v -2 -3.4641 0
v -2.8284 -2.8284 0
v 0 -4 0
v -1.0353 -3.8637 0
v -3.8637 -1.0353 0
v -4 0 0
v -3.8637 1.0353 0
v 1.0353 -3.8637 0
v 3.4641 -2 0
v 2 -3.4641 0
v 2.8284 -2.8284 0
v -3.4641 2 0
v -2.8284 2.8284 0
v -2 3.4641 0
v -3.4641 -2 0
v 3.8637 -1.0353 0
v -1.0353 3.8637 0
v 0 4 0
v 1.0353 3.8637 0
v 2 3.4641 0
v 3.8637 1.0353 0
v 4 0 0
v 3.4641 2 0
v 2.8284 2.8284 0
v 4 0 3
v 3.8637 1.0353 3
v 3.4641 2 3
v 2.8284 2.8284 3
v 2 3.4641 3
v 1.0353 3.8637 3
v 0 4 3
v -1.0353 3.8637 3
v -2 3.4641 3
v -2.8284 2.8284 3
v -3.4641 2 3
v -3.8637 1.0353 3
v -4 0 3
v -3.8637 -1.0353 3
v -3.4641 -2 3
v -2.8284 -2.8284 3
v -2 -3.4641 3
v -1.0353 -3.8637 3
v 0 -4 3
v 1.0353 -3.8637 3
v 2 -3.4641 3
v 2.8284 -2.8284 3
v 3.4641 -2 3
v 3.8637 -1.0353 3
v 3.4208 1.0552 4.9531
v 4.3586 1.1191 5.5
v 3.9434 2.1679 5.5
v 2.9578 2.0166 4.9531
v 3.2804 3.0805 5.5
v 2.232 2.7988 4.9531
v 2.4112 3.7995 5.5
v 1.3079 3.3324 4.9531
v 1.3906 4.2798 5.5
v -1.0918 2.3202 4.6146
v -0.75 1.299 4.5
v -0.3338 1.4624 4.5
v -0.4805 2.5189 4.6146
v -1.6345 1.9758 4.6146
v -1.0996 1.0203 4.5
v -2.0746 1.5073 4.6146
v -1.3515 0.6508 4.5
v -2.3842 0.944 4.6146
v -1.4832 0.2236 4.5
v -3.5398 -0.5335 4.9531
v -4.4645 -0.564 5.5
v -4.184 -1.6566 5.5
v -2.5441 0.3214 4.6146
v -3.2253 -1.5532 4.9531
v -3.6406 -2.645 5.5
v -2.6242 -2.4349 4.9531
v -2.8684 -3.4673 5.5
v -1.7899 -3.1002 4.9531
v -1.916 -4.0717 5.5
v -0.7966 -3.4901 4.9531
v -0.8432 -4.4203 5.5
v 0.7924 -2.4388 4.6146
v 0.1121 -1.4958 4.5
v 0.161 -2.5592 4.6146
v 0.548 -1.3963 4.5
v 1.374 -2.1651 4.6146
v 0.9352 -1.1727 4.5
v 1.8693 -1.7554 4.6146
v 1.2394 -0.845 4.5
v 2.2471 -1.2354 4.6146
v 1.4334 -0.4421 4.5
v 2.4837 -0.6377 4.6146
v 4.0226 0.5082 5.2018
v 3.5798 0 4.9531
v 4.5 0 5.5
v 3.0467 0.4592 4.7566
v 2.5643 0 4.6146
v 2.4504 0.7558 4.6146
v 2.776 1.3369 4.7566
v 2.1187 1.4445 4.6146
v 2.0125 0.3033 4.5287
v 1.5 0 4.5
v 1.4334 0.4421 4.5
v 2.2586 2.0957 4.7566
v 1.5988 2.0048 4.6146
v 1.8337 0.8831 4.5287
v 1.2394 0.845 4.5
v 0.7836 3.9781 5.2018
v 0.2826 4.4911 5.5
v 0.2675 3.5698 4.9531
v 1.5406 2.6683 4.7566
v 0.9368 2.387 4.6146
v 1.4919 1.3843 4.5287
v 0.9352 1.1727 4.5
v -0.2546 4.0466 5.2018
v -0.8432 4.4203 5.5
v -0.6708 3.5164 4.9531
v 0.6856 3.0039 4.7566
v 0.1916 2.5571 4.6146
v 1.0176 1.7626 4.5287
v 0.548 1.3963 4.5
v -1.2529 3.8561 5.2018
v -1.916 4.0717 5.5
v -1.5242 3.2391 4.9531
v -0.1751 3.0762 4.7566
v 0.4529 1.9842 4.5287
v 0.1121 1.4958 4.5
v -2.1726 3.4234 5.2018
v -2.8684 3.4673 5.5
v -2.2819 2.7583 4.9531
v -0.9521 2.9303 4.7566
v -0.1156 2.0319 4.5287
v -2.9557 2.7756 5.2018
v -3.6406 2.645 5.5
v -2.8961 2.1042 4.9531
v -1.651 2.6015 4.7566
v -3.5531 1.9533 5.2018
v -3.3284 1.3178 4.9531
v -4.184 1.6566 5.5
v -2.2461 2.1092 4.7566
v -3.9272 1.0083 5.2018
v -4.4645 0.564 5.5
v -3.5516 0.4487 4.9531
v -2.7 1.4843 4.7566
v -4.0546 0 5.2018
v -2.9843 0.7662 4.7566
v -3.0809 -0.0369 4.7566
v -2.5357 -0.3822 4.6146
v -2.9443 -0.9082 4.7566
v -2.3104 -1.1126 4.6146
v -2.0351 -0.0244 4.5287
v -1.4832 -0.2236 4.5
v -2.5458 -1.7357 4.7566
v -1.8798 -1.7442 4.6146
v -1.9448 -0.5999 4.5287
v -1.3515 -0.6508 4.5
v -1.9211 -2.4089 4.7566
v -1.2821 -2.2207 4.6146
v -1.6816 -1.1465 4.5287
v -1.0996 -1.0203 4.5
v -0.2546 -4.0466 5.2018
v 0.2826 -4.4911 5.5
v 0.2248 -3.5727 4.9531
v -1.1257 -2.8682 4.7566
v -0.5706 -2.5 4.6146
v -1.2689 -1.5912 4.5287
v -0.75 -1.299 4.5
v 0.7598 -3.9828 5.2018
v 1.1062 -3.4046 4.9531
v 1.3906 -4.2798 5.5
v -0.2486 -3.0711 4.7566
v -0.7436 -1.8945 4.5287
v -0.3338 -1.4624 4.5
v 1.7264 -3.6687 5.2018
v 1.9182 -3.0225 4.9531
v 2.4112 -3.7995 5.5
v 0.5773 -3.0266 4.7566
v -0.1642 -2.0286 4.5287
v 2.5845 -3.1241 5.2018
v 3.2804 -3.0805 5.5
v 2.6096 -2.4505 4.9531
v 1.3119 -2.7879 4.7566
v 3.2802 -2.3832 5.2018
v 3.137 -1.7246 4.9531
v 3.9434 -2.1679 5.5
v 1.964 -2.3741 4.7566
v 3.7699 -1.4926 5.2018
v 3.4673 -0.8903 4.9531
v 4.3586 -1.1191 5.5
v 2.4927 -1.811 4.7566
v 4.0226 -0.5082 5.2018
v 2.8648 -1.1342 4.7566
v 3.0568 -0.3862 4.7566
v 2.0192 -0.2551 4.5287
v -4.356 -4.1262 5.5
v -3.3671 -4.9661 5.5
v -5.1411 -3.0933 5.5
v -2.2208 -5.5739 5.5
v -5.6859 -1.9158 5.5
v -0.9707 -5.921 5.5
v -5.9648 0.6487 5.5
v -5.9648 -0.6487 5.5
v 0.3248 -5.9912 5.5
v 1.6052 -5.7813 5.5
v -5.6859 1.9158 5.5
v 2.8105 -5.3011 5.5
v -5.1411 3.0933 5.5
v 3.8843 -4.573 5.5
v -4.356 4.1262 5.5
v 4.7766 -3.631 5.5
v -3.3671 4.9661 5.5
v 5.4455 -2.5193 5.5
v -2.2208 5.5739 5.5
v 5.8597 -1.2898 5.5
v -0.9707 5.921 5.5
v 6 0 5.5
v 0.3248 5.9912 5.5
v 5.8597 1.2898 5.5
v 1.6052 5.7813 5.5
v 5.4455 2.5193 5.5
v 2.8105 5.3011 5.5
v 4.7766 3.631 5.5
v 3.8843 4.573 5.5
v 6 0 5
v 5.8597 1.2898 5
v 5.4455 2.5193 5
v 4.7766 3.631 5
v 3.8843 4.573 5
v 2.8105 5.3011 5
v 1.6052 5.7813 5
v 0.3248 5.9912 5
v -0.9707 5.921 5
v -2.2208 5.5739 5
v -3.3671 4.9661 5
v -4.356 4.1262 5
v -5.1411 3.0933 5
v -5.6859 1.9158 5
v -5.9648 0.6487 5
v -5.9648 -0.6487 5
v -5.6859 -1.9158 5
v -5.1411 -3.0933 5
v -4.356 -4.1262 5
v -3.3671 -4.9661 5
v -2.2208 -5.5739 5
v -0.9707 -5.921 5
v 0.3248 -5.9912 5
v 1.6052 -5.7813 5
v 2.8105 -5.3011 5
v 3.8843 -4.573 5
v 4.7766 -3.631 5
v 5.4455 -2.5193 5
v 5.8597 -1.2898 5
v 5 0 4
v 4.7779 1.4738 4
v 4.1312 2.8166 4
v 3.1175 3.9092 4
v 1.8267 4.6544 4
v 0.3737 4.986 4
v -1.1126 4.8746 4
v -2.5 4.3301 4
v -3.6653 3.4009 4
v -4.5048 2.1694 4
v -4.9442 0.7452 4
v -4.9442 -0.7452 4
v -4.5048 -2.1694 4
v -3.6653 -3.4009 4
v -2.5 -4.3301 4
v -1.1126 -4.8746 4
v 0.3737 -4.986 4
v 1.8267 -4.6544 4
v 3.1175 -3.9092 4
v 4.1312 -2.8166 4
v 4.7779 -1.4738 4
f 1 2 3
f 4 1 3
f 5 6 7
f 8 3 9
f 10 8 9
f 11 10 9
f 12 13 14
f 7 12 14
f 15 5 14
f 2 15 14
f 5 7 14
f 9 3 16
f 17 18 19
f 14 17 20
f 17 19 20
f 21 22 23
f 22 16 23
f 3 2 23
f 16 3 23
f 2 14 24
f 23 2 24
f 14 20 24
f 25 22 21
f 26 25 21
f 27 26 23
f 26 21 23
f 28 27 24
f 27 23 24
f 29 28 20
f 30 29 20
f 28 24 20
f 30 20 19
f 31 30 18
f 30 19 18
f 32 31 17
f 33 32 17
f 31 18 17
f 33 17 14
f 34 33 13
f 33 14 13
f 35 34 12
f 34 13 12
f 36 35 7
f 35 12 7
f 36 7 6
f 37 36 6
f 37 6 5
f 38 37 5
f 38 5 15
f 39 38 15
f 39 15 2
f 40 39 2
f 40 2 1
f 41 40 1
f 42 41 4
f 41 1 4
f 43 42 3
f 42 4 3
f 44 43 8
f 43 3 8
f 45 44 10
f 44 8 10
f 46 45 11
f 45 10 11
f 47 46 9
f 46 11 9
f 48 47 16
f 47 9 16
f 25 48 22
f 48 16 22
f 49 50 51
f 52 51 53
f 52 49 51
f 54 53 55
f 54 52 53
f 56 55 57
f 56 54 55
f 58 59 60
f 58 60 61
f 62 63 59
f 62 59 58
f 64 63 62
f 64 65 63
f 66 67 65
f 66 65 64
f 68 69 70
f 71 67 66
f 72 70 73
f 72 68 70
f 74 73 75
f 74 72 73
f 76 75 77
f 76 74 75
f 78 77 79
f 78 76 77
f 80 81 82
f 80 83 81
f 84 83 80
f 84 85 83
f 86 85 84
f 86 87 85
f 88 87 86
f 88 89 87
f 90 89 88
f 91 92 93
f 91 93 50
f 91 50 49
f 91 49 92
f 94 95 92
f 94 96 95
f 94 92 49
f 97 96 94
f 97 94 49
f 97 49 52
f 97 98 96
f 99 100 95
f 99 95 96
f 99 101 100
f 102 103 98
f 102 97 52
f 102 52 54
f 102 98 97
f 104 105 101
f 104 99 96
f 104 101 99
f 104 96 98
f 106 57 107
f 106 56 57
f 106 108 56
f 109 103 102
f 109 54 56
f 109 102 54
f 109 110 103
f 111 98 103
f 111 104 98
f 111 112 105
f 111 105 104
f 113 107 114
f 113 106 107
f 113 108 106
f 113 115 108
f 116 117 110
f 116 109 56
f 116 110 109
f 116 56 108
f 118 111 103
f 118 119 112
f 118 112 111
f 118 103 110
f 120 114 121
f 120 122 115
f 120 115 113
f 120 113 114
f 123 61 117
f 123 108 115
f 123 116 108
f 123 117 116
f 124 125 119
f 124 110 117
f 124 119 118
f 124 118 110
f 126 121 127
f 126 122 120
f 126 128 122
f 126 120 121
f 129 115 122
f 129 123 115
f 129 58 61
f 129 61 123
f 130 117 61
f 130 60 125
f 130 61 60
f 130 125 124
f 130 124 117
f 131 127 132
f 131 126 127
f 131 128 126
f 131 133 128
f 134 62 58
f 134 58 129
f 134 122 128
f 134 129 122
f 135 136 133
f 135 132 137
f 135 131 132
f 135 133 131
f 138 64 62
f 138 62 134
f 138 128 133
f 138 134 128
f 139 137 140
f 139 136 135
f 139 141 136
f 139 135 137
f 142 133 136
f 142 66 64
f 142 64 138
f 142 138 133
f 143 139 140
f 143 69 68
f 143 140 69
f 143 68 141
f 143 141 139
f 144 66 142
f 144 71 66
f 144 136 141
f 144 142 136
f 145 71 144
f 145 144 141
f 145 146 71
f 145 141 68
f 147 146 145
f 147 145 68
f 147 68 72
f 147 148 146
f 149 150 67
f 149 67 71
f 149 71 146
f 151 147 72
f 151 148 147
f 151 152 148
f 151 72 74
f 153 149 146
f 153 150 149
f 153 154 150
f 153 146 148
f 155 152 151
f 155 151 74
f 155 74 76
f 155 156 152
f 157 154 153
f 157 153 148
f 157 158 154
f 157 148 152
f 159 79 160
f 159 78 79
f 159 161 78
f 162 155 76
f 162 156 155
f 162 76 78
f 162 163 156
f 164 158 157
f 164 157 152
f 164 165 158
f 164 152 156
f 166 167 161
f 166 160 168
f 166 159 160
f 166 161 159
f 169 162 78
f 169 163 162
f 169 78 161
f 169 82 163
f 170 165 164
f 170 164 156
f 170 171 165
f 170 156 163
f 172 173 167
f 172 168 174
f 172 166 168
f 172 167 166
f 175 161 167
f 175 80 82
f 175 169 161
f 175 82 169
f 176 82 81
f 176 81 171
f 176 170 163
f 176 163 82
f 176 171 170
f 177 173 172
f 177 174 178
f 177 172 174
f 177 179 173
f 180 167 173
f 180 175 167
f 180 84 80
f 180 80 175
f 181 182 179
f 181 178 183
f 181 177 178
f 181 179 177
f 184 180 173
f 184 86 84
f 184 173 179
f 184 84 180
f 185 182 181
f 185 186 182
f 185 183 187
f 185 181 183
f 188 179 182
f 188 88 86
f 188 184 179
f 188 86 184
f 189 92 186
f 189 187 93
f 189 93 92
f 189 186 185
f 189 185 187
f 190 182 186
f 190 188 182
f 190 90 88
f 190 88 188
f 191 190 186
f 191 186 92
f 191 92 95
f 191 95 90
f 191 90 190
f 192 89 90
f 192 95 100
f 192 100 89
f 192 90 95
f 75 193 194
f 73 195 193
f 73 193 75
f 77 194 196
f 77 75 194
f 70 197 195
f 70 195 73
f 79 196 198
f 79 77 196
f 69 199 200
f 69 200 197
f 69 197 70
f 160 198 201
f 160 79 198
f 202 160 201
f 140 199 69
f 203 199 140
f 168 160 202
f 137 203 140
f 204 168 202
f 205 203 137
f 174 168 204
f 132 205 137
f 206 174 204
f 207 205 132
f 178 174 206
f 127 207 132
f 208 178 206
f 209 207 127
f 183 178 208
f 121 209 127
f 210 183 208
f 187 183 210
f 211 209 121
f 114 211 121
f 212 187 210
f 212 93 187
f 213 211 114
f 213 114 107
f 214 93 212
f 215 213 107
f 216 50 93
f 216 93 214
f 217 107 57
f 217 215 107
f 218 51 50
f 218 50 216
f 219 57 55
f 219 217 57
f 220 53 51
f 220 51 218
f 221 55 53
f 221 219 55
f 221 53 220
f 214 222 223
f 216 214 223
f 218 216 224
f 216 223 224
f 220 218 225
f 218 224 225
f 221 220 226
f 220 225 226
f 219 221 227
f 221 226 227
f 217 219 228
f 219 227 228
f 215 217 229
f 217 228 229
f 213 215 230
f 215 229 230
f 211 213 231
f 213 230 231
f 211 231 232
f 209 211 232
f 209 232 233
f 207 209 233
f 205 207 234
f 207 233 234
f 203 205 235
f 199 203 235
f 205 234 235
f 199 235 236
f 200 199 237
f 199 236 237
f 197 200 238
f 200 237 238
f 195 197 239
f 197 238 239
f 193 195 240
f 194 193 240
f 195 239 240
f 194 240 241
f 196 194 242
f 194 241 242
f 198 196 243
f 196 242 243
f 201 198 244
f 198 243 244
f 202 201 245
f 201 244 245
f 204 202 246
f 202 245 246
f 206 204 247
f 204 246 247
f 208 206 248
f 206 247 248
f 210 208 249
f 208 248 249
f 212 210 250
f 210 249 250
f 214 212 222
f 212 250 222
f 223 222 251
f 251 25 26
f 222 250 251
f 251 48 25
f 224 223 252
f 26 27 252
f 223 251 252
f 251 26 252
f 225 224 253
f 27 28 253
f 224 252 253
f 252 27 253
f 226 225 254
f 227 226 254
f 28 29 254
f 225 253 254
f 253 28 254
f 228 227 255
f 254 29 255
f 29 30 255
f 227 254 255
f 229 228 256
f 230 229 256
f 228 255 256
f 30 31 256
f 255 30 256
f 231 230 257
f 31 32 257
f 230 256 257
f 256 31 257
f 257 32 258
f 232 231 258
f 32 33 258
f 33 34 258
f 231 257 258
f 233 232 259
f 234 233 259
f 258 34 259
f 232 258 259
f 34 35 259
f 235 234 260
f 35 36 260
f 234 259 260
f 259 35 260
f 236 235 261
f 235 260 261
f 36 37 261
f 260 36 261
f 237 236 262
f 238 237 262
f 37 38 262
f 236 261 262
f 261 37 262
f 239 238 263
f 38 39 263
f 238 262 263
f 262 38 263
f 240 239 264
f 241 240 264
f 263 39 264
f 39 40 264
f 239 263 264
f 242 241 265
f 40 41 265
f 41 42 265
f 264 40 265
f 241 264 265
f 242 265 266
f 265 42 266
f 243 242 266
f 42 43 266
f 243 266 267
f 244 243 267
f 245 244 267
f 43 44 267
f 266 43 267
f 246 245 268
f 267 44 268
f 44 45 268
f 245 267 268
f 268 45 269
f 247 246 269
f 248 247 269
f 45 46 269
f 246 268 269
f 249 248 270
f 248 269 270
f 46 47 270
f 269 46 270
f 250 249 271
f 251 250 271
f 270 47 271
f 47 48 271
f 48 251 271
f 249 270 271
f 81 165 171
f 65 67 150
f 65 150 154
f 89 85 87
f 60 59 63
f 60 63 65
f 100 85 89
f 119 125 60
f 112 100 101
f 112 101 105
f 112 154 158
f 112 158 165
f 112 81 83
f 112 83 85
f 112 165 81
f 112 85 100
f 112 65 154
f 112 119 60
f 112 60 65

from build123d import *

# Parameters (mm, degrees)
F0_R     = 4
F1_DEPTH = 3
F2_R     = 6
F3_DEPTH = 2.5
F4_SIZE  = 1.99999
F5_R     = 4.5
F6_DEPTH = 1


# Not quite as in the source:
# - a fillet or chamfer that OpenCascade refuses, or shapes differently, is made with other operations: its cross-section is extruded or revolved along the edge and cut away or added
# - a fillet or chamfer is up to 0.001 mm smaller than in the source, because OpenCascade refuses the exact size


with BuildPart() as f1:
    # F0 (on Top) → F1 (new body)
    with BuildSketch(Plane.XY):
        Circle(F0_R)
    extrude(amount=F1_DEPTH)

    # F2 (on face) → F3 (join)
    with BuildSketch(Plane.XY.offset(3)):
        Circle(F2_R)
    extrude(amount=F3_DEPTH)

    # F4 (size 2 in the source; OpenCascade refuses exactly that, so slightly less here)
    f4_edges = [f1.edges().sort_by_distance(p)[0] for p in [
        (-6, 0, 3),
    ]]
    chamfer(f4_edges, length=F4_SIZE)

    # F5 (on face) → F6 (cut)
    with BuildSketch(Plane.XY.offset(5.5)):
        Circle(F5_R)
    extrude(amount=-F6_DEPTH, mode=Mode.SUBTRACT)

    # F7: fillet of radius 5 on 1 edges, made by hand

    # F7_s1 → F7_t2 (revolve)
    with BuildSketch(Plane.XZ):
        with BuildLine():
            ThreePointArc((4.5, 5.5), (3.0811388301, 4.7565835097), (1.5, 4.5))
            Line((1.5, 4.5), (4.5, 4.5))
            Line((4.5, 4.5), (4.5, 5.5))
        make_face()
    revolve(axis=Axis((0, 0, 4.5), (0, 0, 1)))


solid = f1.part
